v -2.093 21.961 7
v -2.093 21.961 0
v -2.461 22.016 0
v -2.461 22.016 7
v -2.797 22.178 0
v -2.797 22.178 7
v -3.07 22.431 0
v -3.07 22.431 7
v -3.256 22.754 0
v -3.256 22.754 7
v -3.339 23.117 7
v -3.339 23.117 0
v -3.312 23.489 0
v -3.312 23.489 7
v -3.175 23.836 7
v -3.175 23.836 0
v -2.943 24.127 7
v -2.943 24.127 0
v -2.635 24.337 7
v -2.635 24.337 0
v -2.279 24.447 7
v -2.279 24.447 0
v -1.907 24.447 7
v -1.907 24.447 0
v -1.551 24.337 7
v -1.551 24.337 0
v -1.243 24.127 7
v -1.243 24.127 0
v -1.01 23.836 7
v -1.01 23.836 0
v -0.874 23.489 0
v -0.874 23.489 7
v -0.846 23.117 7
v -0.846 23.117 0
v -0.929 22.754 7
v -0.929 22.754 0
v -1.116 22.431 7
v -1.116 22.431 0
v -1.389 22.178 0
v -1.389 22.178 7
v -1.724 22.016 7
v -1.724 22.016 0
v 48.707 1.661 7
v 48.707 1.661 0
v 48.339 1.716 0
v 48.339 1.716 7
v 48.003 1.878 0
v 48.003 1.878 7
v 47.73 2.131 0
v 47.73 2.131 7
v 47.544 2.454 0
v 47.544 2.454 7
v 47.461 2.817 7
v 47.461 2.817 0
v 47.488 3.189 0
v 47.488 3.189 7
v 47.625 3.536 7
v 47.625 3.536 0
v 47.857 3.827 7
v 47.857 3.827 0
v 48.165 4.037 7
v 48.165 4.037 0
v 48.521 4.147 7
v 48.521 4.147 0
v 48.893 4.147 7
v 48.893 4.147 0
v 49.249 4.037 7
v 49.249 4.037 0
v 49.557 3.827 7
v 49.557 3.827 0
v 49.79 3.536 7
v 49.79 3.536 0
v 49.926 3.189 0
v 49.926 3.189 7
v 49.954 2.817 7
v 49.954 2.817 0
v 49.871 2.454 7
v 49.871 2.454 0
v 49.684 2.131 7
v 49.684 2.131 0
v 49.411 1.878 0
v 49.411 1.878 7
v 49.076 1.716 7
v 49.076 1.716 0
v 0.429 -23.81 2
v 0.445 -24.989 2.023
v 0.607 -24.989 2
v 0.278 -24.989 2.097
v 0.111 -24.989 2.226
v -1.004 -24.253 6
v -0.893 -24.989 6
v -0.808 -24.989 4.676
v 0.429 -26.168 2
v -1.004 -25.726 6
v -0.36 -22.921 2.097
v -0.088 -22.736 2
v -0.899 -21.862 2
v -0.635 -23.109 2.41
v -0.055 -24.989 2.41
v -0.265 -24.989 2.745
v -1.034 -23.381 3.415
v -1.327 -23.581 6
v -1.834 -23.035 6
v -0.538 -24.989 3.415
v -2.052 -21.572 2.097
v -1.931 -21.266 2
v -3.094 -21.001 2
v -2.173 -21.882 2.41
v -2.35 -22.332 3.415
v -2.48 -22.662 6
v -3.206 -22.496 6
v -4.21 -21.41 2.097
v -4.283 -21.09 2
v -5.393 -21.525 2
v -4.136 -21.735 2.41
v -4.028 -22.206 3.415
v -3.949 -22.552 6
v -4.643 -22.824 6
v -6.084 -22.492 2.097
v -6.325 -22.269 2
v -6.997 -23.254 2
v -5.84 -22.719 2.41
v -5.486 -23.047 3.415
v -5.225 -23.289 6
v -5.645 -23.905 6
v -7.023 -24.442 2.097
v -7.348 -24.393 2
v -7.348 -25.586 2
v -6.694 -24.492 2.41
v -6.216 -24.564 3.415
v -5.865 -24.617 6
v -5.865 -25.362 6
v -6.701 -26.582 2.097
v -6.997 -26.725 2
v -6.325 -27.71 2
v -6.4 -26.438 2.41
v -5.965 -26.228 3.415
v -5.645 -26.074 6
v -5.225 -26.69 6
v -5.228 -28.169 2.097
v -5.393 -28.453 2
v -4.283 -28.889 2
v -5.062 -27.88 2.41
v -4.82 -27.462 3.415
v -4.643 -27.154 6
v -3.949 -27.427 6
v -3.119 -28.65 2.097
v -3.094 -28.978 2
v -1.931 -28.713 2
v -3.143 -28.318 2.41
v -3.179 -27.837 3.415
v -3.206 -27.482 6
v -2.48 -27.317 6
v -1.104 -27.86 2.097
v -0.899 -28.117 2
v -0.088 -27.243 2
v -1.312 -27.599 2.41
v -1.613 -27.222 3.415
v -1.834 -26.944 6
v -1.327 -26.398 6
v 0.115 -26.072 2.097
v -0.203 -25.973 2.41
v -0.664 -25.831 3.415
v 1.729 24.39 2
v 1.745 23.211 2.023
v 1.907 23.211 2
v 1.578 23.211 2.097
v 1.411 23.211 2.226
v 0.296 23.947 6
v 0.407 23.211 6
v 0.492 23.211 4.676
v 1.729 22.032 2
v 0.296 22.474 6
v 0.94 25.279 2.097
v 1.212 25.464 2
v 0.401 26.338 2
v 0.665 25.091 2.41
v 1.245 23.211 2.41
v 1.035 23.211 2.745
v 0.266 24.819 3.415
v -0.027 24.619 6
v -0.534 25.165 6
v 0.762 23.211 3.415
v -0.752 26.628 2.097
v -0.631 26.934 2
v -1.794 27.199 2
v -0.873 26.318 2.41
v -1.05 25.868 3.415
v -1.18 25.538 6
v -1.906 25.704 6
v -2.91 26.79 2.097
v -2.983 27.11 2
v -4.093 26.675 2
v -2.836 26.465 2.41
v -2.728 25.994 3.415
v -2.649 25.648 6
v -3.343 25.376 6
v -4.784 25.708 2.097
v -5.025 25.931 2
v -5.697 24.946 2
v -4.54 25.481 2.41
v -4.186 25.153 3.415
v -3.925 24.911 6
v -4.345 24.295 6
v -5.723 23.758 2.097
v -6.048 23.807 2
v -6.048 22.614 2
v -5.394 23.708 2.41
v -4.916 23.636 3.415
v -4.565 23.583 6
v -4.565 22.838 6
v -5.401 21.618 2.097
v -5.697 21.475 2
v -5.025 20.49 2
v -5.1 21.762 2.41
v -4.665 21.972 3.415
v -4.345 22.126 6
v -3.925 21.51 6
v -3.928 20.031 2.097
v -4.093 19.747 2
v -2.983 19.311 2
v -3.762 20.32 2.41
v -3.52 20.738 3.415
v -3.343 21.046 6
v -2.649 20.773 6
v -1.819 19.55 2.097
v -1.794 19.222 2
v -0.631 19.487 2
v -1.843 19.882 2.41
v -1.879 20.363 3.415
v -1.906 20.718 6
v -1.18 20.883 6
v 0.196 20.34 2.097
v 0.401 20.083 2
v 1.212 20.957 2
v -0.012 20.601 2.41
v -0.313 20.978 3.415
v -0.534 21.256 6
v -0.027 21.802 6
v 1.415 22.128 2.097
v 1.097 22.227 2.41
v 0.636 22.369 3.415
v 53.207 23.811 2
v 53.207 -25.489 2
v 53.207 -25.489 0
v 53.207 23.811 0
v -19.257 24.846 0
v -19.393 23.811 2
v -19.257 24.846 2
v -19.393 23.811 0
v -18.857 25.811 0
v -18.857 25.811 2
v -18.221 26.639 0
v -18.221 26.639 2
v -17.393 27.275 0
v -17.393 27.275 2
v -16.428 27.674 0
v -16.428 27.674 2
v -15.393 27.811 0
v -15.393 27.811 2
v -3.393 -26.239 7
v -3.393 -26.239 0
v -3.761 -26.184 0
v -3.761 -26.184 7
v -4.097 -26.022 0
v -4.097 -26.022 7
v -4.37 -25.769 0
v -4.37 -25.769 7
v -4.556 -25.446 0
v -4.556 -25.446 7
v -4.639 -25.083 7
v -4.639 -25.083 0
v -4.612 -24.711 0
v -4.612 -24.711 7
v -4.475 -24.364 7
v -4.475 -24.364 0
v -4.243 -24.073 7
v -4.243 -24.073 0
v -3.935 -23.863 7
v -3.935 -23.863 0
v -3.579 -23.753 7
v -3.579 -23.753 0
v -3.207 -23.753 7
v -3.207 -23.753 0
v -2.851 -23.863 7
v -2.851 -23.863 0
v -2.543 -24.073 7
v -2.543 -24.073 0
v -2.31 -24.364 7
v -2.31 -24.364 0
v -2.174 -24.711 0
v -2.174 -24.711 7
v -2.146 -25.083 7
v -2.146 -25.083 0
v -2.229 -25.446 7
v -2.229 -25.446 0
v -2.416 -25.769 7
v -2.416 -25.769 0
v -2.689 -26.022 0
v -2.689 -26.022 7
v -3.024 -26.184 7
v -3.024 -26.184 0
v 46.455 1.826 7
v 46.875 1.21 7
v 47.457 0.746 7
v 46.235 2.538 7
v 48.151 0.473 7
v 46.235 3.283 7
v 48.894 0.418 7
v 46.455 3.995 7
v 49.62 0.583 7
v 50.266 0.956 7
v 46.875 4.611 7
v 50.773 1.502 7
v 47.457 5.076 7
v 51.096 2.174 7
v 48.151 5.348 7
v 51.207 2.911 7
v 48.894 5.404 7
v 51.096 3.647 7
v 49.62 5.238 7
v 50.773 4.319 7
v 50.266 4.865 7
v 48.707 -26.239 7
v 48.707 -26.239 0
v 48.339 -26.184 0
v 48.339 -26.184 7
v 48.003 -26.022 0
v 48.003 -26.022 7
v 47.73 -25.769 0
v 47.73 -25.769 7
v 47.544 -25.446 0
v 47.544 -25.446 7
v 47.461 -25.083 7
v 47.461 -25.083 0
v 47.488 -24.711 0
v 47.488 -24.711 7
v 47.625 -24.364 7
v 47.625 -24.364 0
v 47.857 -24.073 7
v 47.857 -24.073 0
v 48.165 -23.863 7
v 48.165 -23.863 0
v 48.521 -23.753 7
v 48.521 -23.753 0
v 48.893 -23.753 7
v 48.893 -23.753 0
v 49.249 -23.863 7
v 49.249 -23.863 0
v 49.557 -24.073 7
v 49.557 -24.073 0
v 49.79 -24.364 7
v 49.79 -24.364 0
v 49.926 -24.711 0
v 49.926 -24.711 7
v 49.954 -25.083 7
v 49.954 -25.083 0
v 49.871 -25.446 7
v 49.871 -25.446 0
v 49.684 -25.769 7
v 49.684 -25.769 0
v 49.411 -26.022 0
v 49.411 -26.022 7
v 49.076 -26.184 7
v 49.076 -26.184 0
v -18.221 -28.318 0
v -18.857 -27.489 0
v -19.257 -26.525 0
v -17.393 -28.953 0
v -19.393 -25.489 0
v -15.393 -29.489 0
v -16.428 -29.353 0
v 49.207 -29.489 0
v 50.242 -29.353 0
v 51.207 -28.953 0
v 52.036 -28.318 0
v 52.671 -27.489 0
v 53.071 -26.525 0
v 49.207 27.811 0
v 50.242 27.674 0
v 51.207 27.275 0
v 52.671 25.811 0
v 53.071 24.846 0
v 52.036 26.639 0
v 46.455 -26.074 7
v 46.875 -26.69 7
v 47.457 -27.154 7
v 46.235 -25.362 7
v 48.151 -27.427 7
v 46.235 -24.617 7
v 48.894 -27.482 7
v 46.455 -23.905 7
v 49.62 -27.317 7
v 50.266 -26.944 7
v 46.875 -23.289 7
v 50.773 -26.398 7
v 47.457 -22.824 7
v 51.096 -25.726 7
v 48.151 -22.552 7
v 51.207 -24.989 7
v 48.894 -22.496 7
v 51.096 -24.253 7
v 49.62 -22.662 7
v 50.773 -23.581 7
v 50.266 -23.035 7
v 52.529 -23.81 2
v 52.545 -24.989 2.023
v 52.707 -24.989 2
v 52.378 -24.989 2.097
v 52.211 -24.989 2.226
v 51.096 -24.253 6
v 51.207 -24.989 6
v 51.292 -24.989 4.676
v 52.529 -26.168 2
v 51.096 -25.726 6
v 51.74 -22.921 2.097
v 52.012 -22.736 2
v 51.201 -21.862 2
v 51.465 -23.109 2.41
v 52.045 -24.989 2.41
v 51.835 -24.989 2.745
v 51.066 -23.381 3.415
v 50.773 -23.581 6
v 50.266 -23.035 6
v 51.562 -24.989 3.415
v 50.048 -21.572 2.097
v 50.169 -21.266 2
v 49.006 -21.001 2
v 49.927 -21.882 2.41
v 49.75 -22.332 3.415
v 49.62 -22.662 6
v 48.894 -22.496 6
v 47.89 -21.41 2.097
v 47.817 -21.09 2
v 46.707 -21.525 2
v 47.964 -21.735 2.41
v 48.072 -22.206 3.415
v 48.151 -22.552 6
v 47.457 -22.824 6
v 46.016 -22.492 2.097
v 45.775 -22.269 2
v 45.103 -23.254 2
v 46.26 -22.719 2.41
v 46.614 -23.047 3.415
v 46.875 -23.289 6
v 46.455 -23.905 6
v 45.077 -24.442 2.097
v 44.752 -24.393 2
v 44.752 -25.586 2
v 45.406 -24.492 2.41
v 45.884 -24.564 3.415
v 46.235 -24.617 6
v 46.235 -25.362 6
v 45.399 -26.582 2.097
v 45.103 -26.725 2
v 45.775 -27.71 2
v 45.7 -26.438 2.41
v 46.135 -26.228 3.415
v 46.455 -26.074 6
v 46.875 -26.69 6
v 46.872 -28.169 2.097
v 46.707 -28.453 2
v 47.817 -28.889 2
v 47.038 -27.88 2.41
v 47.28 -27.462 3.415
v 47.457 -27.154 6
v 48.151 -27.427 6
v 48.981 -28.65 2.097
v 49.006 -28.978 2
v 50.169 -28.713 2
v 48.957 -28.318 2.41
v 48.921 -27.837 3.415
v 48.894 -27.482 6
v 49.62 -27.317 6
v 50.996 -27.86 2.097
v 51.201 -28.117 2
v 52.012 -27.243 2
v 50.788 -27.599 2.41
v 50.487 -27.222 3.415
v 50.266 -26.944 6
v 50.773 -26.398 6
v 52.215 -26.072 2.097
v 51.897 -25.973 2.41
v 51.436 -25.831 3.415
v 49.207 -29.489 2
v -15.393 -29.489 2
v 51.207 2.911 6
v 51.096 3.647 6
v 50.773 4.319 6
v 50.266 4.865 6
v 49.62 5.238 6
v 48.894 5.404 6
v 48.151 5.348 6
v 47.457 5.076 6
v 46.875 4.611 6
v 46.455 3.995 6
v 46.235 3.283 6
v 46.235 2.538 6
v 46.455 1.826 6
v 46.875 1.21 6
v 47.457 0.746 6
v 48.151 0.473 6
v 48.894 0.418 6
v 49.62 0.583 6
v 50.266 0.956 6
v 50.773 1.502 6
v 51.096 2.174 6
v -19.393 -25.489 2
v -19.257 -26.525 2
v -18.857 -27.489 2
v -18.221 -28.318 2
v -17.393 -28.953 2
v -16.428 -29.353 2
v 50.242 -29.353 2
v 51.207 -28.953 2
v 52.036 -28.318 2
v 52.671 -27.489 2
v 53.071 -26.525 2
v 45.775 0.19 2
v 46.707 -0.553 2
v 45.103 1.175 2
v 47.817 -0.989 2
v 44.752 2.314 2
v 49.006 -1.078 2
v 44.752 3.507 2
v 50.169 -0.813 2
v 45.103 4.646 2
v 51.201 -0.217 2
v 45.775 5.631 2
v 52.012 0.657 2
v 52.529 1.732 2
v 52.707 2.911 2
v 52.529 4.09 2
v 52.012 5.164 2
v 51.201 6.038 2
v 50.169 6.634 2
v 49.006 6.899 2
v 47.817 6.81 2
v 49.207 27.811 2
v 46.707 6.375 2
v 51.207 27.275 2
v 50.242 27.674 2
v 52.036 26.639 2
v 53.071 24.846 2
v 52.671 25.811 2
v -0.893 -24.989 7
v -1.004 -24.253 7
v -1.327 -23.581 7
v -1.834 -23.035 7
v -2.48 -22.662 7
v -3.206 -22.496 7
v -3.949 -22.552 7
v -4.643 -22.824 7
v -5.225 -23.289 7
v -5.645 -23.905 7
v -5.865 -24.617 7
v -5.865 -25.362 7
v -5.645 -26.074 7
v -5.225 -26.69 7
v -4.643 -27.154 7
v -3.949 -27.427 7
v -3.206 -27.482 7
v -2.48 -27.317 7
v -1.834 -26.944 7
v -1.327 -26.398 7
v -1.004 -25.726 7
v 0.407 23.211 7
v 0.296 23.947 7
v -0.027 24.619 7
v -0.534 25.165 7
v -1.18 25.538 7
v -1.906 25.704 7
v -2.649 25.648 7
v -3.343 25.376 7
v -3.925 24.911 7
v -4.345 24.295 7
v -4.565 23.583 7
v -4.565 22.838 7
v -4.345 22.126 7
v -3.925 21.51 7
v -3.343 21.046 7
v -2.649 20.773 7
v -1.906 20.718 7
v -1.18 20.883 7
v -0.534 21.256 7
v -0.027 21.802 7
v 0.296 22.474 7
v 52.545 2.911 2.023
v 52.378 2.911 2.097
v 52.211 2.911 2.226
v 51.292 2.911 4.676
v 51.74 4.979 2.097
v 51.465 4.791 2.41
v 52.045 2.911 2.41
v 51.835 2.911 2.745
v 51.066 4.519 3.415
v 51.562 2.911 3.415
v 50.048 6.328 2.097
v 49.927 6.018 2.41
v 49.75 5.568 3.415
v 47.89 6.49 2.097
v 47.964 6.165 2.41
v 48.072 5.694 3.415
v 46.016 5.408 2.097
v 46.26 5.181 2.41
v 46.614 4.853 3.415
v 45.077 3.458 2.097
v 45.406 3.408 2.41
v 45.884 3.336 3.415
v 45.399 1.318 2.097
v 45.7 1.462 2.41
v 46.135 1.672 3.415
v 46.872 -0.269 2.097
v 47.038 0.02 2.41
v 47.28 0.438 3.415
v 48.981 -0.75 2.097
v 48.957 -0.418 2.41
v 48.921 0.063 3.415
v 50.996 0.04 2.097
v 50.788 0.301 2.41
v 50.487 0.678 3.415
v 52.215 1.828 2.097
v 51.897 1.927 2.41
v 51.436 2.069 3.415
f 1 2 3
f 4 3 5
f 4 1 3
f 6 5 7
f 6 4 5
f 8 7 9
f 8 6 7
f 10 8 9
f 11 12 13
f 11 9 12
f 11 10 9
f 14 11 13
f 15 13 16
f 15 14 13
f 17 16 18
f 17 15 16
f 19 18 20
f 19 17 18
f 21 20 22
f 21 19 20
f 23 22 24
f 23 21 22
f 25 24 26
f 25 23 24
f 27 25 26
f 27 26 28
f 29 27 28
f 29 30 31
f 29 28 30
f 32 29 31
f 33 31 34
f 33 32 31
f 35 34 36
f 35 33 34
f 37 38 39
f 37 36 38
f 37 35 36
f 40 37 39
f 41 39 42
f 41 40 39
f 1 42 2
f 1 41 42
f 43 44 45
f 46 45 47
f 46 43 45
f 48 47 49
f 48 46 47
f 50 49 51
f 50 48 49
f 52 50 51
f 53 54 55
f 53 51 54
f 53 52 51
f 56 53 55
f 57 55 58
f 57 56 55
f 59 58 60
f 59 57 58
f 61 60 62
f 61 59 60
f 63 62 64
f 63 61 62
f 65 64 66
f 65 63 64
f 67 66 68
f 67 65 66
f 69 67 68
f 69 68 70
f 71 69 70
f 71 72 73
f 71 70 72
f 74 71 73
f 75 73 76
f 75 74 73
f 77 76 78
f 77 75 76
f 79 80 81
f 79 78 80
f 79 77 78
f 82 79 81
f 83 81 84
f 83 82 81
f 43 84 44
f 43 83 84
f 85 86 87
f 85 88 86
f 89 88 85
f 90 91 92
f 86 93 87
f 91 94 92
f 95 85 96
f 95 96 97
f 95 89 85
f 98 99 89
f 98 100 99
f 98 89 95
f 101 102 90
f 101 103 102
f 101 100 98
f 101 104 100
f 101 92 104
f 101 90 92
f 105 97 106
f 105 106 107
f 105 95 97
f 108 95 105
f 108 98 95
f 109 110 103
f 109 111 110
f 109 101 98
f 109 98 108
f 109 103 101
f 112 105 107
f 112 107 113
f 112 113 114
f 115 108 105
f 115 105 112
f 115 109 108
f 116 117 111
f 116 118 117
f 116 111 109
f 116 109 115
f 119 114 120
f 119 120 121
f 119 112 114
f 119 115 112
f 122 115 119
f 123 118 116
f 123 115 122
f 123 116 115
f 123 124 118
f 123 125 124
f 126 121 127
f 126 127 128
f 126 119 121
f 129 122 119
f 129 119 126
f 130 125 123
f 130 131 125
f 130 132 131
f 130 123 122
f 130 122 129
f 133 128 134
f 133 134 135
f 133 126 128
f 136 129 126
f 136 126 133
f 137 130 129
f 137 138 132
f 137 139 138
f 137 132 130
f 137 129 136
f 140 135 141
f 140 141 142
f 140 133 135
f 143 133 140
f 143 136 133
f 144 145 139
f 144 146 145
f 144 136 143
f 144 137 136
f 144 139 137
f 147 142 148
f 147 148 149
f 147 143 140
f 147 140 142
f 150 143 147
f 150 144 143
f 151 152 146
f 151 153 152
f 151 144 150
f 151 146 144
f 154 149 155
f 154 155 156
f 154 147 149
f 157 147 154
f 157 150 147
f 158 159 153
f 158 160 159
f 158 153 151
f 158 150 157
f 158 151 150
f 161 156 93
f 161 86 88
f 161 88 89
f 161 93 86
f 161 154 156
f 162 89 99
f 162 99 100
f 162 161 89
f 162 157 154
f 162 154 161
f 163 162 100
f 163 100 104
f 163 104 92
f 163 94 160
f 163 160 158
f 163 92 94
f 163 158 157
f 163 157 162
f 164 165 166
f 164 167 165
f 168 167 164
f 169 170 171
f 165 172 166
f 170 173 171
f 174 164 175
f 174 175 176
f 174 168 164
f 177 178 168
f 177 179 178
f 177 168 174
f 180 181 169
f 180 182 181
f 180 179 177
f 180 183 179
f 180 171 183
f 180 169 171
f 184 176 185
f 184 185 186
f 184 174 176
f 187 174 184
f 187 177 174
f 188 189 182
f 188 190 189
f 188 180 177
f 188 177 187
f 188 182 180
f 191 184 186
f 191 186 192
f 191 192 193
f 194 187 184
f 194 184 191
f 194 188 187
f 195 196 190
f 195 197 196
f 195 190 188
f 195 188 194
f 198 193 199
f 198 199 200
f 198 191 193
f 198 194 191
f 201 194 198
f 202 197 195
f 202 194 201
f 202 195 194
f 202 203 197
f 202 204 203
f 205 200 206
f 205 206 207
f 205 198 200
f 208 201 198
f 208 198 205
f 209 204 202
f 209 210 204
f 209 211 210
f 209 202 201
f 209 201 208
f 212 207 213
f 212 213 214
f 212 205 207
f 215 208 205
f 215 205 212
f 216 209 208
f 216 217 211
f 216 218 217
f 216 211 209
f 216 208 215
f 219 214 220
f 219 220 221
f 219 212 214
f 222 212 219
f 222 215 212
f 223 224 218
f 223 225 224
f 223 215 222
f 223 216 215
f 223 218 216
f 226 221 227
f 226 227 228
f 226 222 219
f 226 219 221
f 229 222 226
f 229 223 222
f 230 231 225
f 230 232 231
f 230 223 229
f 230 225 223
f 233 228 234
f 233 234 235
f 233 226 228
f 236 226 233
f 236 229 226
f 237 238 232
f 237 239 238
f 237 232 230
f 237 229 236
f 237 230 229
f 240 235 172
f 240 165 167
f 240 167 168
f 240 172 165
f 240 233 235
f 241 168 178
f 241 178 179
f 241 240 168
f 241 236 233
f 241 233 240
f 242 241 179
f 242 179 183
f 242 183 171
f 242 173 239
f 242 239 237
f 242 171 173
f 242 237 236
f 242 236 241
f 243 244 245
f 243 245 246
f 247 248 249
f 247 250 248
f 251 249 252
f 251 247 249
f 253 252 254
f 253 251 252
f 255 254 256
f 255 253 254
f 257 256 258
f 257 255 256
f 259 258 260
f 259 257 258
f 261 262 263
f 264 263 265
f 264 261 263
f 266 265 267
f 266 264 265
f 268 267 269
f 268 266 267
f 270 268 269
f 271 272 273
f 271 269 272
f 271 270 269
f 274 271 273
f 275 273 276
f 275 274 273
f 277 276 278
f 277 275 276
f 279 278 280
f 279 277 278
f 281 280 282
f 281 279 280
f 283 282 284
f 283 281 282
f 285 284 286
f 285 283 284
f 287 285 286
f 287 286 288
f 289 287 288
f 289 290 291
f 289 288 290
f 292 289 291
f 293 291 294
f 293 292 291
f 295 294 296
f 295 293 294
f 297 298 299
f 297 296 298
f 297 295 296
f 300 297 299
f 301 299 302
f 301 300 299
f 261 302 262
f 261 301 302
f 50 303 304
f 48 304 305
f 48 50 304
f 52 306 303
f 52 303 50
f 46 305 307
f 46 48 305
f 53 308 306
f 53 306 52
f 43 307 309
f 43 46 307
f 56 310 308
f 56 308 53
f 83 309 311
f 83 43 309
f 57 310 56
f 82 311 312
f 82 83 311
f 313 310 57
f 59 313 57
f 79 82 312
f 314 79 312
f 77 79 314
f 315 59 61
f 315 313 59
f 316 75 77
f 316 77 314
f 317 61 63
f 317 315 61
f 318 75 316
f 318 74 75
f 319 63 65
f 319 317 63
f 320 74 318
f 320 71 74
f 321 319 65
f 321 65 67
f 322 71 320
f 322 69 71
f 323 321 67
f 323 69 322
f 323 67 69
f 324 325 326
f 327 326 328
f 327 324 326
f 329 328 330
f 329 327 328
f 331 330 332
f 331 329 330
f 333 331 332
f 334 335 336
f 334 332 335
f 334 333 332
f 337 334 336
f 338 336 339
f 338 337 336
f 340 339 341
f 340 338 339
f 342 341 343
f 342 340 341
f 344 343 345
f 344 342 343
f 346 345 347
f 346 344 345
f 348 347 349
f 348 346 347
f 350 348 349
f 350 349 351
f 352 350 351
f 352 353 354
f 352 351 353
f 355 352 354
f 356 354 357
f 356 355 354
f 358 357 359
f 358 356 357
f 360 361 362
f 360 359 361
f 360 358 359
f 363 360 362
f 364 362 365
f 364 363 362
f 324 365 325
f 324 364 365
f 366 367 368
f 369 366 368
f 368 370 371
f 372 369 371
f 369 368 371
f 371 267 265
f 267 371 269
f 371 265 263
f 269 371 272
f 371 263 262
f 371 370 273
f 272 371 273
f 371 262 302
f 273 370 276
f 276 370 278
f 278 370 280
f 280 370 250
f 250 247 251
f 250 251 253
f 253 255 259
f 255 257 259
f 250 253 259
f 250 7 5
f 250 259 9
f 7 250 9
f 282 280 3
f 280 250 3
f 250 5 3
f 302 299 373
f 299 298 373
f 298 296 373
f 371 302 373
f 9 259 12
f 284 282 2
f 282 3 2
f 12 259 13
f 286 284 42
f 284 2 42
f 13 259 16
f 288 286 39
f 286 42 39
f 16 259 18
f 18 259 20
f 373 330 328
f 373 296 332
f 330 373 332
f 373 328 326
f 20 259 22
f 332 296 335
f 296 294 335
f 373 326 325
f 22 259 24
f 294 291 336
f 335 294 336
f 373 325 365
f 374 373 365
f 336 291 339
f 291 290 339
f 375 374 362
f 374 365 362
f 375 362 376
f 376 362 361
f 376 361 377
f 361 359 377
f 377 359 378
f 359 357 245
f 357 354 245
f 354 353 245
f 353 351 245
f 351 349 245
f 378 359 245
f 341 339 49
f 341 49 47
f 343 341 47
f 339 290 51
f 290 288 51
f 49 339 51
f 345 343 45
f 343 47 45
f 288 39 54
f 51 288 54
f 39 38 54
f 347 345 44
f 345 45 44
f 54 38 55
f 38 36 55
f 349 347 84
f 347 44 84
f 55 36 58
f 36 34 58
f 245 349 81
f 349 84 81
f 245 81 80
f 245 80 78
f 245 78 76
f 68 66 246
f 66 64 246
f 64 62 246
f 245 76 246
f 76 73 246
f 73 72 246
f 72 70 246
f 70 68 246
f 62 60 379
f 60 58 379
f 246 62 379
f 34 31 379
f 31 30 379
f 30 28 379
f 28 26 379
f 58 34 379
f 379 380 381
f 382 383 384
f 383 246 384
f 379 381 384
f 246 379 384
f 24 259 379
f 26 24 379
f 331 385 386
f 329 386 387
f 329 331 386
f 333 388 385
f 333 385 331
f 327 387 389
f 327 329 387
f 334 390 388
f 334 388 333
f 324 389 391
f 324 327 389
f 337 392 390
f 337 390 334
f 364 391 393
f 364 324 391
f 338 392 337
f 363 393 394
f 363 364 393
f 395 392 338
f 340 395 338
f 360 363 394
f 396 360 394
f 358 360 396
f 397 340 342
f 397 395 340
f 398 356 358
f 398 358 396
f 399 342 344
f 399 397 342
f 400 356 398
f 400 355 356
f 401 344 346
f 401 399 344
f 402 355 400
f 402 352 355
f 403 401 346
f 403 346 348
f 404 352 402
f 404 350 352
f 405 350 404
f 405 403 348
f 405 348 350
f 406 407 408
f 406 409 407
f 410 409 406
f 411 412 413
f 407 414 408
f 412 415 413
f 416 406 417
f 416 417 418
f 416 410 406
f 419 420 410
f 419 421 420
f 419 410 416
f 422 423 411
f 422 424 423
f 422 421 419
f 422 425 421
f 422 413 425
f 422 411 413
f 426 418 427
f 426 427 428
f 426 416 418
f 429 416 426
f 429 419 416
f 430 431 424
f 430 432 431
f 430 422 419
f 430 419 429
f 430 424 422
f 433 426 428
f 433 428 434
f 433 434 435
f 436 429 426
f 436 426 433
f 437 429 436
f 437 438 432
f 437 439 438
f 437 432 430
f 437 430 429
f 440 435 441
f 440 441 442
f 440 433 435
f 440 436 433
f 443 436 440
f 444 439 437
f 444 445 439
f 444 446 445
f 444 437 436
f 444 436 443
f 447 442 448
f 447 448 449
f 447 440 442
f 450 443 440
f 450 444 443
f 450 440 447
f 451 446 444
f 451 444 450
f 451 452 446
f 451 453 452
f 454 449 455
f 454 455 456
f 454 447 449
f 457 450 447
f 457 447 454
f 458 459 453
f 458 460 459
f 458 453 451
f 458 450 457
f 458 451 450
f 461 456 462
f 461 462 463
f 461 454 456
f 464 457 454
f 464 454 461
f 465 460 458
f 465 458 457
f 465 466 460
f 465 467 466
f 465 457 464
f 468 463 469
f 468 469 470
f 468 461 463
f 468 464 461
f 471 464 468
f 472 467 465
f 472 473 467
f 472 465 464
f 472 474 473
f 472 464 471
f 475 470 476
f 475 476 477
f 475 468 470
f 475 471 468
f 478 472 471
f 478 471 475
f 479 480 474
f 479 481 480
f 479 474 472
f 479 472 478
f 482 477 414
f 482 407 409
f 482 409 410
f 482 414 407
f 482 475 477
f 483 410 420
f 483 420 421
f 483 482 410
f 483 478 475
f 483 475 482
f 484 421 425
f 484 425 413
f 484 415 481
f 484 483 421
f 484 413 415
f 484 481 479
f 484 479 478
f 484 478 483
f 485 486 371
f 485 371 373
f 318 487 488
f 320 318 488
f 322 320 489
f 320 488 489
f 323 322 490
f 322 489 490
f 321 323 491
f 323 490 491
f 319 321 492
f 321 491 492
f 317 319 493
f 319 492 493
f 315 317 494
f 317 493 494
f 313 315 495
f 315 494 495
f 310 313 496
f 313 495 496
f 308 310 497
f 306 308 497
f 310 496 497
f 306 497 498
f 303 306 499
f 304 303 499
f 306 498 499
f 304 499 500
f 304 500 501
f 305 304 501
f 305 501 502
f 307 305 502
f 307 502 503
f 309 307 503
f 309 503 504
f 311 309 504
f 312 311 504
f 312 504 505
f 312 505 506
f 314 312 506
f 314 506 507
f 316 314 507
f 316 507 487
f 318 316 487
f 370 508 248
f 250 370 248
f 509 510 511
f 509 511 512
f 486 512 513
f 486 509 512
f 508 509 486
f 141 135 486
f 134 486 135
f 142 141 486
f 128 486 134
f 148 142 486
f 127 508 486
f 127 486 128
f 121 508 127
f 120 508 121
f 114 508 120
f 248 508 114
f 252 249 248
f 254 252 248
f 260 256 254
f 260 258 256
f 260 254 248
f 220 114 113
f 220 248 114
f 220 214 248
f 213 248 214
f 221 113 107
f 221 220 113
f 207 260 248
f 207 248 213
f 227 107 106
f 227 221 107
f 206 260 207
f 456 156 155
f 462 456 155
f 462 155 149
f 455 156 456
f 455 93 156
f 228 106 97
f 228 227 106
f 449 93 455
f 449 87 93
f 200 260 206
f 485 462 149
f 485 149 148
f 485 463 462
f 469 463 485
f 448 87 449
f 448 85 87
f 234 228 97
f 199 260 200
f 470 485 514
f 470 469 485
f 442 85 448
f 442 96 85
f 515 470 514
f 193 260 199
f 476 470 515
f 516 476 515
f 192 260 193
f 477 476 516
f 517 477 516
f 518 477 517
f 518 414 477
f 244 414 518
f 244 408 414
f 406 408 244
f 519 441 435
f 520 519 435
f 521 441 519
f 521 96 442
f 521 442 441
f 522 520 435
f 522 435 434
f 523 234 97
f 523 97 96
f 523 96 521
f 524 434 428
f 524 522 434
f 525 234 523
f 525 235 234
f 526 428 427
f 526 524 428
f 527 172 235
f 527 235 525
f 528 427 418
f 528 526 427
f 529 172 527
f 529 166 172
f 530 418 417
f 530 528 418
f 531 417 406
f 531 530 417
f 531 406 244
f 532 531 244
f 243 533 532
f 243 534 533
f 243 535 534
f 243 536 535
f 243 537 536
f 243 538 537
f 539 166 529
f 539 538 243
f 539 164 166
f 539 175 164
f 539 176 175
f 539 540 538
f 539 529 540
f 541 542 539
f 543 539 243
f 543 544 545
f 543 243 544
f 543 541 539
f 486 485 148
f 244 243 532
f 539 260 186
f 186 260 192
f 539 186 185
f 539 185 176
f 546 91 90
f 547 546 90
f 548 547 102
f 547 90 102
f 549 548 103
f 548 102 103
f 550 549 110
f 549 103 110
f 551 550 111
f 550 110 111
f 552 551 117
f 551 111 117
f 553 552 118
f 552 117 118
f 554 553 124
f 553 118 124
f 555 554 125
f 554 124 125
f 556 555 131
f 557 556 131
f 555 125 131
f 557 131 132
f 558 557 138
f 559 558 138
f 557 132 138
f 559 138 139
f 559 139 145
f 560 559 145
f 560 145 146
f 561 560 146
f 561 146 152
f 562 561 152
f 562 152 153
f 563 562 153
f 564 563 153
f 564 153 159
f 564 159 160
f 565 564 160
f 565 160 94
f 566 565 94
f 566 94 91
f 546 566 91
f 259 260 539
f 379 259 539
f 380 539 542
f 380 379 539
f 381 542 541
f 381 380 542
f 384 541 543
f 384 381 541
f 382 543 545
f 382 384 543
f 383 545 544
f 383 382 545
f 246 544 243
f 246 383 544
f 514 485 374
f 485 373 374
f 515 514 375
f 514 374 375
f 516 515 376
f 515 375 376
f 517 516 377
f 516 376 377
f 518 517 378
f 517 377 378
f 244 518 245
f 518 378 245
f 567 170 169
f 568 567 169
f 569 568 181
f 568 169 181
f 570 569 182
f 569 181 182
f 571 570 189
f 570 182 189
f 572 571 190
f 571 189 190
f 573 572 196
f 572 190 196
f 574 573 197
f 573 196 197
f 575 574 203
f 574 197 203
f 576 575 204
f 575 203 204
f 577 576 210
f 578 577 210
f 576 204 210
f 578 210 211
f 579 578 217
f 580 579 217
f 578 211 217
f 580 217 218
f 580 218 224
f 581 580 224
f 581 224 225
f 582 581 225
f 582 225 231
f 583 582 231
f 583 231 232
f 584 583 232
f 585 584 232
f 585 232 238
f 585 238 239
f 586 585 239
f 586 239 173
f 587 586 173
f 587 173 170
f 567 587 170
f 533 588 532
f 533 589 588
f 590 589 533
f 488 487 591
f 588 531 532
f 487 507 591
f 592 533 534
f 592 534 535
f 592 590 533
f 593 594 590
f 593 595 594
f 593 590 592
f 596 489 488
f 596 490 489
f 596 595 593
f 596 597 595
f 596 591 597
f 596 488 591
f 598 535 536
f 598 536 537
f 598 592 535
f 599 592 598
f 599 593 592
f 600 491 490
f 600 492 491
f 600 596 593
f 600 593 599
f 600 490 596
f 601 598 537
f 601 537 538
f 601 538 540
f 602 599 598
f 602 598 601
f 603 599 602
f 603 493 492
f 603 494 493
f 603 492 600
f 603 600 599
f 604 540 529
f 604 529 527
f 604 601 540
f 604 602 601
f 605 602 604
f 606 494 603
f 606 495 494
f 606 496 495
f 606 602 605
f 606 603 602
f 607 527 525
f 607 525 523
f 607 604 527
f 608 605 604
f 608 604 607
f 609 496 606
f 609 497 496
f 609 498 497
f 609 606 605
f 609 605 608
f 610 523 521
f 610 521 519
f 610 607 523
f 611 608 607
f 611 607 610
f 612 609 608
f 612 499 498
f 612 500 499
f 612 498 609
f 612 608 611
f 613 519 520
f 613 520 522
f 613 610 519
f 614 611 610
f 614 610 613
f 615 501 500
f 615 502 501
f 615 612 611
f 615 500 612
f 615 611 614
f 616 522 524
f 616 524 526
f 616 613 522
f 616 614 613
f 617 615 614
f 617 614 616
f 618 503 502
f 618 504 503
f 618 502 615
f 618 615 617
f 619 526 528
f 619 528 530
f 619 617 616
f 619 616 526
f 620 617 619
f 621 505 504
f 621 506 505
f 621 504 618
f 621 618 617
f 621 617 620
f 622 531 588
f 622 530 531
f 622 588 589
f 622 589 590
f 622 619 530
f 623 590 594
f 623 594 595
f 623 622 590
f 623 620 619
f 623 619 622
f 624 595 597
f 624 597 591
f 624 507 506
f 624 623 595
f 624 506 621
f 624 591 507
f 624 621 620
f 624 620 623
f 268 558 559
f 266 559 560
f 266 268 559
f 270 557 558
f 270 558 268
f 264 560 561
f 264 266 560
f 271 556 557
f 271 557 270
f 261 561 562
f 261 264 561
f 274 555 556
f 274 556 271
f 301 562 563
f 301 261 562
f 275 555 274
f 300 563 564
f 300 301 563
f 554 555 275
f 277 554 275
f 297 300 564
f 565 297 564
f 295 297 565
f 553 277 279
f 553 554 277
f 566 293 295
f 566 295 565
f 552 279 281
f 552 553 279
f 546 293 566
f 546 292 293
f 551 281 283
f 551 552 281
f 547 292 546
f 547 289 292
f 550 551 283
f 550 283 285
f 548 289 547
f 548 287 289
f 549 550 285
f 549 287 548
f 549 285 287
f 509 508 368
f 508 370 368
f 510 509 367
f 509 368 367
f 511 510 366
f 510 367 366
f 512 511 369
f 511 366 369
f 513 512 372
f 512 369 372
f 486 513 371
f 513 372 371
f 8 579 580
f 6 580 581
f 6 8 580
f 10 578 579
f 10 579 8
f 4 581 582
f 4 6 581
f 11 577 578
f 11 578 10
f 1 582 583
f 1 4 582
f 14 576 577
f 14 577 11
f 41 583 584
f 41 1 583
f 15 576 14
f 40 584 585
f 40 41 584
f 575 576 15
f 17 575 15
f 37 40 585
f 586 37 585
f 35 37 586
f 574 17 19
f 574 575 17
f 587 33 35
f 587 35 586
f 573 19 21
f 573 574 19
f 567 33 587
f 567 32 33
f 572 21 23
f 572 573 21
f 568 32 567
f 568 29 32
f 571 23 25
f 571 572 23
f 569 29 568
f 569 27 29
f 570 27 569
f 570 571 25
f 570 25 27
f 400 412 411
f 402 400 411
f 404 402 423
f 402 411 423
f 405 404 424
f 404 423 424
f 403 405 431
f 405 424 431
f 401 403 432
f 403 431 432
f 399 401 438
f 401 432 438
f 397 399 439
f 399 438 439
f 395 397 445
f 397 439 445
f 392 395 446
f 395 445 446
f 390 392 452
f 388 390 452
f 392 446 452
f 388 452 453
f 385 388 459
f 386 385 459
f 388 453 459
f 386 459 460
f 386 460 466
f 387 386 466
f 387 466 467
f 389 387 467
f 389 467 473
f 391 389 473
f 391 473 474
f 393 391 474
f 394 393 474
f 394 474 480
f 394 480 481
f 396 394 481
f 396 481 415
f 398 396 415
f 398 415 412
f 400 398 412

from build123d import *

# Parameters (mm, degrees)
SKETCH1_W           = 68.6
SKETCH1_H           = 53.3
BOSS_EXTRUDE1_DEPTH = 2
SKETCH6_W           = 72.6
SKETCH6_H           = 57.3
BOSS_EXTRUDE3_DEPTH = 2
SKETCH3_R           = 2.5
BOSS_EXTRUDE2_DEPTH = 5
FILLET1_SIZE        = 1.5
FILLET1_SIZE_2      = 4
FILLET2_R           = 4


with BuildPart() as part:
    # Sketch1 → Boss-Extrude1 (new body)
    with BuildSketch(Plane.XY):
        with Locations((16.907139599, -0.839393248)):
            Rectangle(SKETCH1_W, SKETCH1_H)
    extrude(amount=BOSS_EXTRUDE1_DEPTH)

    # Sketch6 → Boss-Extrude3 (add)
    with BuildSketch(Plane.XY.offset(2)):
        with Locations((16.907139599, -0.839393248)):
            Rectangle(SKETCH6_W, SKETCH6_H)
    extrude(amount=-BOSS_EXTRUDE3_DEPTH)

    # Sketch3 → Boss-Extrude2 (add)
    with BuildSketch(Plane.XY.offset(2)):
        with Locations((-2.092860401, 23.210606752)):
            Circle(SKETCH3_R)
    boss_extrude2 = extrude(amount=BOSS_EXTRUDE2_DEPTH)

    # Sketch5 → Tap Drill for M3x0.5 Tap1 (revolve, cut)
    with BuildSketch(Plane(origin=(-2.092860401, 23.210606752, 7), x_dir=(0, -1, 0), z_dir=(1, 0, 0))):
        Polygon((0, 0), (0, 10.751075774), (1.25, 10), (1.25, 0), align=None)
    tap_drill_for_m3x0_5_tap1 = revolve(axis=Axis((-2.092860401, 23.210606752, 13.35), (0, 0, -1)), mode=Mode.SUBTRACT)

    # Sketch-Pattern1: Boss-Extrude2, Tap Drill for M3x0.5 Tap1 at 3 more places
    with Locations((50.8, -48.2, 0), (-1.3, -48.2, 0), (50.8, -20.3, 0)):
        add(boss_extrude2)
        add(tap_drill_for_m3x0_5_tap1, mode=Mode.SUBTRACT)

    # Fillet1
    # an asymmetric fillet: 4, 1.5 mm, written as the material it adds along each edge
    with BuildSketch(Plane(origin=(-2.092860401, 23.210606752, 2), x_dir=(1, 0, 0), z_dir=(0, -1, 0))) as fillet1_piece_1:
        with BuildLine():
            Bezier((2.5 + FILLET1_SIZE, 0), (2.5, 0), (2.5, FILLET1_SIZE_2), weights=[1, 0.707106781, 1])
            Line((2.5, FILLET1_SIZE_2), (2.5, 0))
            Line((2.5, 0), (2.5 + FILLET1_SIZE, 0))
        make_face()
    revolve(axis=Axis((-2.092860401, 23.210606752, 2), (0, 0, 1)))
    with BuildSketch(Plane(origin=(48.707139599, -24.989393248, 2), x_dir=(1, 0, 0), z_dir=(0, -1, 0))) as fillet1_piece_2:
        with BuildLine():
            Bezier((2.5 + FILLET1_SIZE, 0), (2.5, 0), (2.5, FILLET1_SIZE_2), weights=[1, 0.707106781, 1])
            Line((2.5, FILLET1_SIZE_2), (2.5, 0))
            Line((2.5, 0), (2.5 + FILLET1_SIZE, 0))
        make_face()
    revolve(axis=Axis((48.707139599, -24.989393248, 2), (0, 0, 1)))
    with BuildSketch(Plane(origin=(-3.392860401, -24.989393248, 2), x_dir=(1, 0, 0), z_dir=(0, -1, 0))) as fillet1_piece_3:
        with BuildLine():
            Bezier((2.5 + FILLET1_SIZE, 0), (2.5, 0), (2.5, FILLET1_SIZE_2), weights=[1, 0.707106781, 1])
            Line((2.5, FILLET1_SIZE_2), (2.5, 0))
            Line((2.5, 0), (2.5 + FILLET1_SIZE, 0))
        make_face()
    revolve(axis=Axis((-3.392860401, -24.989393248, 2), (0, 0, 1)))
    with BuildSketch(Plane(origin=(48.707139599, 2.910606752, 2), x_dir=(1, 0, 0), z_dir=(0, -1, 0))) as fillet1_piece_4:
        with BuildLine():
            Bezier((2.5 + FILLET1_SIZE, 0), (2.5, 0), (2.5, FILLET1_SIZE_2), weights=[1, 0.707106781, 1])
            Line((2.5, FILLET1_SIZE_2), (2.5, 0))
            Line((2.5, 0), (2.5 + FILLET1_SIZE, 0))
        make_face()
    revolve(axis=Axis((48.707139599, 2.910606752, 2), (0, 0, 1)))

    # Fillet2
    fillet2_edges = [part.edges().sort_by_distance(p)[0] for p in [
        (-19.392860401, 27.810606752, 1),
        (53.207139599, 27.810606752, 1),
        (53.207139599, -29.489393248, 1),
        (-19.392860401, -29.489393248, 1),
    ]]
    fillet(fillet2_edges, radius=FILLET2_R)


solid = part.part
